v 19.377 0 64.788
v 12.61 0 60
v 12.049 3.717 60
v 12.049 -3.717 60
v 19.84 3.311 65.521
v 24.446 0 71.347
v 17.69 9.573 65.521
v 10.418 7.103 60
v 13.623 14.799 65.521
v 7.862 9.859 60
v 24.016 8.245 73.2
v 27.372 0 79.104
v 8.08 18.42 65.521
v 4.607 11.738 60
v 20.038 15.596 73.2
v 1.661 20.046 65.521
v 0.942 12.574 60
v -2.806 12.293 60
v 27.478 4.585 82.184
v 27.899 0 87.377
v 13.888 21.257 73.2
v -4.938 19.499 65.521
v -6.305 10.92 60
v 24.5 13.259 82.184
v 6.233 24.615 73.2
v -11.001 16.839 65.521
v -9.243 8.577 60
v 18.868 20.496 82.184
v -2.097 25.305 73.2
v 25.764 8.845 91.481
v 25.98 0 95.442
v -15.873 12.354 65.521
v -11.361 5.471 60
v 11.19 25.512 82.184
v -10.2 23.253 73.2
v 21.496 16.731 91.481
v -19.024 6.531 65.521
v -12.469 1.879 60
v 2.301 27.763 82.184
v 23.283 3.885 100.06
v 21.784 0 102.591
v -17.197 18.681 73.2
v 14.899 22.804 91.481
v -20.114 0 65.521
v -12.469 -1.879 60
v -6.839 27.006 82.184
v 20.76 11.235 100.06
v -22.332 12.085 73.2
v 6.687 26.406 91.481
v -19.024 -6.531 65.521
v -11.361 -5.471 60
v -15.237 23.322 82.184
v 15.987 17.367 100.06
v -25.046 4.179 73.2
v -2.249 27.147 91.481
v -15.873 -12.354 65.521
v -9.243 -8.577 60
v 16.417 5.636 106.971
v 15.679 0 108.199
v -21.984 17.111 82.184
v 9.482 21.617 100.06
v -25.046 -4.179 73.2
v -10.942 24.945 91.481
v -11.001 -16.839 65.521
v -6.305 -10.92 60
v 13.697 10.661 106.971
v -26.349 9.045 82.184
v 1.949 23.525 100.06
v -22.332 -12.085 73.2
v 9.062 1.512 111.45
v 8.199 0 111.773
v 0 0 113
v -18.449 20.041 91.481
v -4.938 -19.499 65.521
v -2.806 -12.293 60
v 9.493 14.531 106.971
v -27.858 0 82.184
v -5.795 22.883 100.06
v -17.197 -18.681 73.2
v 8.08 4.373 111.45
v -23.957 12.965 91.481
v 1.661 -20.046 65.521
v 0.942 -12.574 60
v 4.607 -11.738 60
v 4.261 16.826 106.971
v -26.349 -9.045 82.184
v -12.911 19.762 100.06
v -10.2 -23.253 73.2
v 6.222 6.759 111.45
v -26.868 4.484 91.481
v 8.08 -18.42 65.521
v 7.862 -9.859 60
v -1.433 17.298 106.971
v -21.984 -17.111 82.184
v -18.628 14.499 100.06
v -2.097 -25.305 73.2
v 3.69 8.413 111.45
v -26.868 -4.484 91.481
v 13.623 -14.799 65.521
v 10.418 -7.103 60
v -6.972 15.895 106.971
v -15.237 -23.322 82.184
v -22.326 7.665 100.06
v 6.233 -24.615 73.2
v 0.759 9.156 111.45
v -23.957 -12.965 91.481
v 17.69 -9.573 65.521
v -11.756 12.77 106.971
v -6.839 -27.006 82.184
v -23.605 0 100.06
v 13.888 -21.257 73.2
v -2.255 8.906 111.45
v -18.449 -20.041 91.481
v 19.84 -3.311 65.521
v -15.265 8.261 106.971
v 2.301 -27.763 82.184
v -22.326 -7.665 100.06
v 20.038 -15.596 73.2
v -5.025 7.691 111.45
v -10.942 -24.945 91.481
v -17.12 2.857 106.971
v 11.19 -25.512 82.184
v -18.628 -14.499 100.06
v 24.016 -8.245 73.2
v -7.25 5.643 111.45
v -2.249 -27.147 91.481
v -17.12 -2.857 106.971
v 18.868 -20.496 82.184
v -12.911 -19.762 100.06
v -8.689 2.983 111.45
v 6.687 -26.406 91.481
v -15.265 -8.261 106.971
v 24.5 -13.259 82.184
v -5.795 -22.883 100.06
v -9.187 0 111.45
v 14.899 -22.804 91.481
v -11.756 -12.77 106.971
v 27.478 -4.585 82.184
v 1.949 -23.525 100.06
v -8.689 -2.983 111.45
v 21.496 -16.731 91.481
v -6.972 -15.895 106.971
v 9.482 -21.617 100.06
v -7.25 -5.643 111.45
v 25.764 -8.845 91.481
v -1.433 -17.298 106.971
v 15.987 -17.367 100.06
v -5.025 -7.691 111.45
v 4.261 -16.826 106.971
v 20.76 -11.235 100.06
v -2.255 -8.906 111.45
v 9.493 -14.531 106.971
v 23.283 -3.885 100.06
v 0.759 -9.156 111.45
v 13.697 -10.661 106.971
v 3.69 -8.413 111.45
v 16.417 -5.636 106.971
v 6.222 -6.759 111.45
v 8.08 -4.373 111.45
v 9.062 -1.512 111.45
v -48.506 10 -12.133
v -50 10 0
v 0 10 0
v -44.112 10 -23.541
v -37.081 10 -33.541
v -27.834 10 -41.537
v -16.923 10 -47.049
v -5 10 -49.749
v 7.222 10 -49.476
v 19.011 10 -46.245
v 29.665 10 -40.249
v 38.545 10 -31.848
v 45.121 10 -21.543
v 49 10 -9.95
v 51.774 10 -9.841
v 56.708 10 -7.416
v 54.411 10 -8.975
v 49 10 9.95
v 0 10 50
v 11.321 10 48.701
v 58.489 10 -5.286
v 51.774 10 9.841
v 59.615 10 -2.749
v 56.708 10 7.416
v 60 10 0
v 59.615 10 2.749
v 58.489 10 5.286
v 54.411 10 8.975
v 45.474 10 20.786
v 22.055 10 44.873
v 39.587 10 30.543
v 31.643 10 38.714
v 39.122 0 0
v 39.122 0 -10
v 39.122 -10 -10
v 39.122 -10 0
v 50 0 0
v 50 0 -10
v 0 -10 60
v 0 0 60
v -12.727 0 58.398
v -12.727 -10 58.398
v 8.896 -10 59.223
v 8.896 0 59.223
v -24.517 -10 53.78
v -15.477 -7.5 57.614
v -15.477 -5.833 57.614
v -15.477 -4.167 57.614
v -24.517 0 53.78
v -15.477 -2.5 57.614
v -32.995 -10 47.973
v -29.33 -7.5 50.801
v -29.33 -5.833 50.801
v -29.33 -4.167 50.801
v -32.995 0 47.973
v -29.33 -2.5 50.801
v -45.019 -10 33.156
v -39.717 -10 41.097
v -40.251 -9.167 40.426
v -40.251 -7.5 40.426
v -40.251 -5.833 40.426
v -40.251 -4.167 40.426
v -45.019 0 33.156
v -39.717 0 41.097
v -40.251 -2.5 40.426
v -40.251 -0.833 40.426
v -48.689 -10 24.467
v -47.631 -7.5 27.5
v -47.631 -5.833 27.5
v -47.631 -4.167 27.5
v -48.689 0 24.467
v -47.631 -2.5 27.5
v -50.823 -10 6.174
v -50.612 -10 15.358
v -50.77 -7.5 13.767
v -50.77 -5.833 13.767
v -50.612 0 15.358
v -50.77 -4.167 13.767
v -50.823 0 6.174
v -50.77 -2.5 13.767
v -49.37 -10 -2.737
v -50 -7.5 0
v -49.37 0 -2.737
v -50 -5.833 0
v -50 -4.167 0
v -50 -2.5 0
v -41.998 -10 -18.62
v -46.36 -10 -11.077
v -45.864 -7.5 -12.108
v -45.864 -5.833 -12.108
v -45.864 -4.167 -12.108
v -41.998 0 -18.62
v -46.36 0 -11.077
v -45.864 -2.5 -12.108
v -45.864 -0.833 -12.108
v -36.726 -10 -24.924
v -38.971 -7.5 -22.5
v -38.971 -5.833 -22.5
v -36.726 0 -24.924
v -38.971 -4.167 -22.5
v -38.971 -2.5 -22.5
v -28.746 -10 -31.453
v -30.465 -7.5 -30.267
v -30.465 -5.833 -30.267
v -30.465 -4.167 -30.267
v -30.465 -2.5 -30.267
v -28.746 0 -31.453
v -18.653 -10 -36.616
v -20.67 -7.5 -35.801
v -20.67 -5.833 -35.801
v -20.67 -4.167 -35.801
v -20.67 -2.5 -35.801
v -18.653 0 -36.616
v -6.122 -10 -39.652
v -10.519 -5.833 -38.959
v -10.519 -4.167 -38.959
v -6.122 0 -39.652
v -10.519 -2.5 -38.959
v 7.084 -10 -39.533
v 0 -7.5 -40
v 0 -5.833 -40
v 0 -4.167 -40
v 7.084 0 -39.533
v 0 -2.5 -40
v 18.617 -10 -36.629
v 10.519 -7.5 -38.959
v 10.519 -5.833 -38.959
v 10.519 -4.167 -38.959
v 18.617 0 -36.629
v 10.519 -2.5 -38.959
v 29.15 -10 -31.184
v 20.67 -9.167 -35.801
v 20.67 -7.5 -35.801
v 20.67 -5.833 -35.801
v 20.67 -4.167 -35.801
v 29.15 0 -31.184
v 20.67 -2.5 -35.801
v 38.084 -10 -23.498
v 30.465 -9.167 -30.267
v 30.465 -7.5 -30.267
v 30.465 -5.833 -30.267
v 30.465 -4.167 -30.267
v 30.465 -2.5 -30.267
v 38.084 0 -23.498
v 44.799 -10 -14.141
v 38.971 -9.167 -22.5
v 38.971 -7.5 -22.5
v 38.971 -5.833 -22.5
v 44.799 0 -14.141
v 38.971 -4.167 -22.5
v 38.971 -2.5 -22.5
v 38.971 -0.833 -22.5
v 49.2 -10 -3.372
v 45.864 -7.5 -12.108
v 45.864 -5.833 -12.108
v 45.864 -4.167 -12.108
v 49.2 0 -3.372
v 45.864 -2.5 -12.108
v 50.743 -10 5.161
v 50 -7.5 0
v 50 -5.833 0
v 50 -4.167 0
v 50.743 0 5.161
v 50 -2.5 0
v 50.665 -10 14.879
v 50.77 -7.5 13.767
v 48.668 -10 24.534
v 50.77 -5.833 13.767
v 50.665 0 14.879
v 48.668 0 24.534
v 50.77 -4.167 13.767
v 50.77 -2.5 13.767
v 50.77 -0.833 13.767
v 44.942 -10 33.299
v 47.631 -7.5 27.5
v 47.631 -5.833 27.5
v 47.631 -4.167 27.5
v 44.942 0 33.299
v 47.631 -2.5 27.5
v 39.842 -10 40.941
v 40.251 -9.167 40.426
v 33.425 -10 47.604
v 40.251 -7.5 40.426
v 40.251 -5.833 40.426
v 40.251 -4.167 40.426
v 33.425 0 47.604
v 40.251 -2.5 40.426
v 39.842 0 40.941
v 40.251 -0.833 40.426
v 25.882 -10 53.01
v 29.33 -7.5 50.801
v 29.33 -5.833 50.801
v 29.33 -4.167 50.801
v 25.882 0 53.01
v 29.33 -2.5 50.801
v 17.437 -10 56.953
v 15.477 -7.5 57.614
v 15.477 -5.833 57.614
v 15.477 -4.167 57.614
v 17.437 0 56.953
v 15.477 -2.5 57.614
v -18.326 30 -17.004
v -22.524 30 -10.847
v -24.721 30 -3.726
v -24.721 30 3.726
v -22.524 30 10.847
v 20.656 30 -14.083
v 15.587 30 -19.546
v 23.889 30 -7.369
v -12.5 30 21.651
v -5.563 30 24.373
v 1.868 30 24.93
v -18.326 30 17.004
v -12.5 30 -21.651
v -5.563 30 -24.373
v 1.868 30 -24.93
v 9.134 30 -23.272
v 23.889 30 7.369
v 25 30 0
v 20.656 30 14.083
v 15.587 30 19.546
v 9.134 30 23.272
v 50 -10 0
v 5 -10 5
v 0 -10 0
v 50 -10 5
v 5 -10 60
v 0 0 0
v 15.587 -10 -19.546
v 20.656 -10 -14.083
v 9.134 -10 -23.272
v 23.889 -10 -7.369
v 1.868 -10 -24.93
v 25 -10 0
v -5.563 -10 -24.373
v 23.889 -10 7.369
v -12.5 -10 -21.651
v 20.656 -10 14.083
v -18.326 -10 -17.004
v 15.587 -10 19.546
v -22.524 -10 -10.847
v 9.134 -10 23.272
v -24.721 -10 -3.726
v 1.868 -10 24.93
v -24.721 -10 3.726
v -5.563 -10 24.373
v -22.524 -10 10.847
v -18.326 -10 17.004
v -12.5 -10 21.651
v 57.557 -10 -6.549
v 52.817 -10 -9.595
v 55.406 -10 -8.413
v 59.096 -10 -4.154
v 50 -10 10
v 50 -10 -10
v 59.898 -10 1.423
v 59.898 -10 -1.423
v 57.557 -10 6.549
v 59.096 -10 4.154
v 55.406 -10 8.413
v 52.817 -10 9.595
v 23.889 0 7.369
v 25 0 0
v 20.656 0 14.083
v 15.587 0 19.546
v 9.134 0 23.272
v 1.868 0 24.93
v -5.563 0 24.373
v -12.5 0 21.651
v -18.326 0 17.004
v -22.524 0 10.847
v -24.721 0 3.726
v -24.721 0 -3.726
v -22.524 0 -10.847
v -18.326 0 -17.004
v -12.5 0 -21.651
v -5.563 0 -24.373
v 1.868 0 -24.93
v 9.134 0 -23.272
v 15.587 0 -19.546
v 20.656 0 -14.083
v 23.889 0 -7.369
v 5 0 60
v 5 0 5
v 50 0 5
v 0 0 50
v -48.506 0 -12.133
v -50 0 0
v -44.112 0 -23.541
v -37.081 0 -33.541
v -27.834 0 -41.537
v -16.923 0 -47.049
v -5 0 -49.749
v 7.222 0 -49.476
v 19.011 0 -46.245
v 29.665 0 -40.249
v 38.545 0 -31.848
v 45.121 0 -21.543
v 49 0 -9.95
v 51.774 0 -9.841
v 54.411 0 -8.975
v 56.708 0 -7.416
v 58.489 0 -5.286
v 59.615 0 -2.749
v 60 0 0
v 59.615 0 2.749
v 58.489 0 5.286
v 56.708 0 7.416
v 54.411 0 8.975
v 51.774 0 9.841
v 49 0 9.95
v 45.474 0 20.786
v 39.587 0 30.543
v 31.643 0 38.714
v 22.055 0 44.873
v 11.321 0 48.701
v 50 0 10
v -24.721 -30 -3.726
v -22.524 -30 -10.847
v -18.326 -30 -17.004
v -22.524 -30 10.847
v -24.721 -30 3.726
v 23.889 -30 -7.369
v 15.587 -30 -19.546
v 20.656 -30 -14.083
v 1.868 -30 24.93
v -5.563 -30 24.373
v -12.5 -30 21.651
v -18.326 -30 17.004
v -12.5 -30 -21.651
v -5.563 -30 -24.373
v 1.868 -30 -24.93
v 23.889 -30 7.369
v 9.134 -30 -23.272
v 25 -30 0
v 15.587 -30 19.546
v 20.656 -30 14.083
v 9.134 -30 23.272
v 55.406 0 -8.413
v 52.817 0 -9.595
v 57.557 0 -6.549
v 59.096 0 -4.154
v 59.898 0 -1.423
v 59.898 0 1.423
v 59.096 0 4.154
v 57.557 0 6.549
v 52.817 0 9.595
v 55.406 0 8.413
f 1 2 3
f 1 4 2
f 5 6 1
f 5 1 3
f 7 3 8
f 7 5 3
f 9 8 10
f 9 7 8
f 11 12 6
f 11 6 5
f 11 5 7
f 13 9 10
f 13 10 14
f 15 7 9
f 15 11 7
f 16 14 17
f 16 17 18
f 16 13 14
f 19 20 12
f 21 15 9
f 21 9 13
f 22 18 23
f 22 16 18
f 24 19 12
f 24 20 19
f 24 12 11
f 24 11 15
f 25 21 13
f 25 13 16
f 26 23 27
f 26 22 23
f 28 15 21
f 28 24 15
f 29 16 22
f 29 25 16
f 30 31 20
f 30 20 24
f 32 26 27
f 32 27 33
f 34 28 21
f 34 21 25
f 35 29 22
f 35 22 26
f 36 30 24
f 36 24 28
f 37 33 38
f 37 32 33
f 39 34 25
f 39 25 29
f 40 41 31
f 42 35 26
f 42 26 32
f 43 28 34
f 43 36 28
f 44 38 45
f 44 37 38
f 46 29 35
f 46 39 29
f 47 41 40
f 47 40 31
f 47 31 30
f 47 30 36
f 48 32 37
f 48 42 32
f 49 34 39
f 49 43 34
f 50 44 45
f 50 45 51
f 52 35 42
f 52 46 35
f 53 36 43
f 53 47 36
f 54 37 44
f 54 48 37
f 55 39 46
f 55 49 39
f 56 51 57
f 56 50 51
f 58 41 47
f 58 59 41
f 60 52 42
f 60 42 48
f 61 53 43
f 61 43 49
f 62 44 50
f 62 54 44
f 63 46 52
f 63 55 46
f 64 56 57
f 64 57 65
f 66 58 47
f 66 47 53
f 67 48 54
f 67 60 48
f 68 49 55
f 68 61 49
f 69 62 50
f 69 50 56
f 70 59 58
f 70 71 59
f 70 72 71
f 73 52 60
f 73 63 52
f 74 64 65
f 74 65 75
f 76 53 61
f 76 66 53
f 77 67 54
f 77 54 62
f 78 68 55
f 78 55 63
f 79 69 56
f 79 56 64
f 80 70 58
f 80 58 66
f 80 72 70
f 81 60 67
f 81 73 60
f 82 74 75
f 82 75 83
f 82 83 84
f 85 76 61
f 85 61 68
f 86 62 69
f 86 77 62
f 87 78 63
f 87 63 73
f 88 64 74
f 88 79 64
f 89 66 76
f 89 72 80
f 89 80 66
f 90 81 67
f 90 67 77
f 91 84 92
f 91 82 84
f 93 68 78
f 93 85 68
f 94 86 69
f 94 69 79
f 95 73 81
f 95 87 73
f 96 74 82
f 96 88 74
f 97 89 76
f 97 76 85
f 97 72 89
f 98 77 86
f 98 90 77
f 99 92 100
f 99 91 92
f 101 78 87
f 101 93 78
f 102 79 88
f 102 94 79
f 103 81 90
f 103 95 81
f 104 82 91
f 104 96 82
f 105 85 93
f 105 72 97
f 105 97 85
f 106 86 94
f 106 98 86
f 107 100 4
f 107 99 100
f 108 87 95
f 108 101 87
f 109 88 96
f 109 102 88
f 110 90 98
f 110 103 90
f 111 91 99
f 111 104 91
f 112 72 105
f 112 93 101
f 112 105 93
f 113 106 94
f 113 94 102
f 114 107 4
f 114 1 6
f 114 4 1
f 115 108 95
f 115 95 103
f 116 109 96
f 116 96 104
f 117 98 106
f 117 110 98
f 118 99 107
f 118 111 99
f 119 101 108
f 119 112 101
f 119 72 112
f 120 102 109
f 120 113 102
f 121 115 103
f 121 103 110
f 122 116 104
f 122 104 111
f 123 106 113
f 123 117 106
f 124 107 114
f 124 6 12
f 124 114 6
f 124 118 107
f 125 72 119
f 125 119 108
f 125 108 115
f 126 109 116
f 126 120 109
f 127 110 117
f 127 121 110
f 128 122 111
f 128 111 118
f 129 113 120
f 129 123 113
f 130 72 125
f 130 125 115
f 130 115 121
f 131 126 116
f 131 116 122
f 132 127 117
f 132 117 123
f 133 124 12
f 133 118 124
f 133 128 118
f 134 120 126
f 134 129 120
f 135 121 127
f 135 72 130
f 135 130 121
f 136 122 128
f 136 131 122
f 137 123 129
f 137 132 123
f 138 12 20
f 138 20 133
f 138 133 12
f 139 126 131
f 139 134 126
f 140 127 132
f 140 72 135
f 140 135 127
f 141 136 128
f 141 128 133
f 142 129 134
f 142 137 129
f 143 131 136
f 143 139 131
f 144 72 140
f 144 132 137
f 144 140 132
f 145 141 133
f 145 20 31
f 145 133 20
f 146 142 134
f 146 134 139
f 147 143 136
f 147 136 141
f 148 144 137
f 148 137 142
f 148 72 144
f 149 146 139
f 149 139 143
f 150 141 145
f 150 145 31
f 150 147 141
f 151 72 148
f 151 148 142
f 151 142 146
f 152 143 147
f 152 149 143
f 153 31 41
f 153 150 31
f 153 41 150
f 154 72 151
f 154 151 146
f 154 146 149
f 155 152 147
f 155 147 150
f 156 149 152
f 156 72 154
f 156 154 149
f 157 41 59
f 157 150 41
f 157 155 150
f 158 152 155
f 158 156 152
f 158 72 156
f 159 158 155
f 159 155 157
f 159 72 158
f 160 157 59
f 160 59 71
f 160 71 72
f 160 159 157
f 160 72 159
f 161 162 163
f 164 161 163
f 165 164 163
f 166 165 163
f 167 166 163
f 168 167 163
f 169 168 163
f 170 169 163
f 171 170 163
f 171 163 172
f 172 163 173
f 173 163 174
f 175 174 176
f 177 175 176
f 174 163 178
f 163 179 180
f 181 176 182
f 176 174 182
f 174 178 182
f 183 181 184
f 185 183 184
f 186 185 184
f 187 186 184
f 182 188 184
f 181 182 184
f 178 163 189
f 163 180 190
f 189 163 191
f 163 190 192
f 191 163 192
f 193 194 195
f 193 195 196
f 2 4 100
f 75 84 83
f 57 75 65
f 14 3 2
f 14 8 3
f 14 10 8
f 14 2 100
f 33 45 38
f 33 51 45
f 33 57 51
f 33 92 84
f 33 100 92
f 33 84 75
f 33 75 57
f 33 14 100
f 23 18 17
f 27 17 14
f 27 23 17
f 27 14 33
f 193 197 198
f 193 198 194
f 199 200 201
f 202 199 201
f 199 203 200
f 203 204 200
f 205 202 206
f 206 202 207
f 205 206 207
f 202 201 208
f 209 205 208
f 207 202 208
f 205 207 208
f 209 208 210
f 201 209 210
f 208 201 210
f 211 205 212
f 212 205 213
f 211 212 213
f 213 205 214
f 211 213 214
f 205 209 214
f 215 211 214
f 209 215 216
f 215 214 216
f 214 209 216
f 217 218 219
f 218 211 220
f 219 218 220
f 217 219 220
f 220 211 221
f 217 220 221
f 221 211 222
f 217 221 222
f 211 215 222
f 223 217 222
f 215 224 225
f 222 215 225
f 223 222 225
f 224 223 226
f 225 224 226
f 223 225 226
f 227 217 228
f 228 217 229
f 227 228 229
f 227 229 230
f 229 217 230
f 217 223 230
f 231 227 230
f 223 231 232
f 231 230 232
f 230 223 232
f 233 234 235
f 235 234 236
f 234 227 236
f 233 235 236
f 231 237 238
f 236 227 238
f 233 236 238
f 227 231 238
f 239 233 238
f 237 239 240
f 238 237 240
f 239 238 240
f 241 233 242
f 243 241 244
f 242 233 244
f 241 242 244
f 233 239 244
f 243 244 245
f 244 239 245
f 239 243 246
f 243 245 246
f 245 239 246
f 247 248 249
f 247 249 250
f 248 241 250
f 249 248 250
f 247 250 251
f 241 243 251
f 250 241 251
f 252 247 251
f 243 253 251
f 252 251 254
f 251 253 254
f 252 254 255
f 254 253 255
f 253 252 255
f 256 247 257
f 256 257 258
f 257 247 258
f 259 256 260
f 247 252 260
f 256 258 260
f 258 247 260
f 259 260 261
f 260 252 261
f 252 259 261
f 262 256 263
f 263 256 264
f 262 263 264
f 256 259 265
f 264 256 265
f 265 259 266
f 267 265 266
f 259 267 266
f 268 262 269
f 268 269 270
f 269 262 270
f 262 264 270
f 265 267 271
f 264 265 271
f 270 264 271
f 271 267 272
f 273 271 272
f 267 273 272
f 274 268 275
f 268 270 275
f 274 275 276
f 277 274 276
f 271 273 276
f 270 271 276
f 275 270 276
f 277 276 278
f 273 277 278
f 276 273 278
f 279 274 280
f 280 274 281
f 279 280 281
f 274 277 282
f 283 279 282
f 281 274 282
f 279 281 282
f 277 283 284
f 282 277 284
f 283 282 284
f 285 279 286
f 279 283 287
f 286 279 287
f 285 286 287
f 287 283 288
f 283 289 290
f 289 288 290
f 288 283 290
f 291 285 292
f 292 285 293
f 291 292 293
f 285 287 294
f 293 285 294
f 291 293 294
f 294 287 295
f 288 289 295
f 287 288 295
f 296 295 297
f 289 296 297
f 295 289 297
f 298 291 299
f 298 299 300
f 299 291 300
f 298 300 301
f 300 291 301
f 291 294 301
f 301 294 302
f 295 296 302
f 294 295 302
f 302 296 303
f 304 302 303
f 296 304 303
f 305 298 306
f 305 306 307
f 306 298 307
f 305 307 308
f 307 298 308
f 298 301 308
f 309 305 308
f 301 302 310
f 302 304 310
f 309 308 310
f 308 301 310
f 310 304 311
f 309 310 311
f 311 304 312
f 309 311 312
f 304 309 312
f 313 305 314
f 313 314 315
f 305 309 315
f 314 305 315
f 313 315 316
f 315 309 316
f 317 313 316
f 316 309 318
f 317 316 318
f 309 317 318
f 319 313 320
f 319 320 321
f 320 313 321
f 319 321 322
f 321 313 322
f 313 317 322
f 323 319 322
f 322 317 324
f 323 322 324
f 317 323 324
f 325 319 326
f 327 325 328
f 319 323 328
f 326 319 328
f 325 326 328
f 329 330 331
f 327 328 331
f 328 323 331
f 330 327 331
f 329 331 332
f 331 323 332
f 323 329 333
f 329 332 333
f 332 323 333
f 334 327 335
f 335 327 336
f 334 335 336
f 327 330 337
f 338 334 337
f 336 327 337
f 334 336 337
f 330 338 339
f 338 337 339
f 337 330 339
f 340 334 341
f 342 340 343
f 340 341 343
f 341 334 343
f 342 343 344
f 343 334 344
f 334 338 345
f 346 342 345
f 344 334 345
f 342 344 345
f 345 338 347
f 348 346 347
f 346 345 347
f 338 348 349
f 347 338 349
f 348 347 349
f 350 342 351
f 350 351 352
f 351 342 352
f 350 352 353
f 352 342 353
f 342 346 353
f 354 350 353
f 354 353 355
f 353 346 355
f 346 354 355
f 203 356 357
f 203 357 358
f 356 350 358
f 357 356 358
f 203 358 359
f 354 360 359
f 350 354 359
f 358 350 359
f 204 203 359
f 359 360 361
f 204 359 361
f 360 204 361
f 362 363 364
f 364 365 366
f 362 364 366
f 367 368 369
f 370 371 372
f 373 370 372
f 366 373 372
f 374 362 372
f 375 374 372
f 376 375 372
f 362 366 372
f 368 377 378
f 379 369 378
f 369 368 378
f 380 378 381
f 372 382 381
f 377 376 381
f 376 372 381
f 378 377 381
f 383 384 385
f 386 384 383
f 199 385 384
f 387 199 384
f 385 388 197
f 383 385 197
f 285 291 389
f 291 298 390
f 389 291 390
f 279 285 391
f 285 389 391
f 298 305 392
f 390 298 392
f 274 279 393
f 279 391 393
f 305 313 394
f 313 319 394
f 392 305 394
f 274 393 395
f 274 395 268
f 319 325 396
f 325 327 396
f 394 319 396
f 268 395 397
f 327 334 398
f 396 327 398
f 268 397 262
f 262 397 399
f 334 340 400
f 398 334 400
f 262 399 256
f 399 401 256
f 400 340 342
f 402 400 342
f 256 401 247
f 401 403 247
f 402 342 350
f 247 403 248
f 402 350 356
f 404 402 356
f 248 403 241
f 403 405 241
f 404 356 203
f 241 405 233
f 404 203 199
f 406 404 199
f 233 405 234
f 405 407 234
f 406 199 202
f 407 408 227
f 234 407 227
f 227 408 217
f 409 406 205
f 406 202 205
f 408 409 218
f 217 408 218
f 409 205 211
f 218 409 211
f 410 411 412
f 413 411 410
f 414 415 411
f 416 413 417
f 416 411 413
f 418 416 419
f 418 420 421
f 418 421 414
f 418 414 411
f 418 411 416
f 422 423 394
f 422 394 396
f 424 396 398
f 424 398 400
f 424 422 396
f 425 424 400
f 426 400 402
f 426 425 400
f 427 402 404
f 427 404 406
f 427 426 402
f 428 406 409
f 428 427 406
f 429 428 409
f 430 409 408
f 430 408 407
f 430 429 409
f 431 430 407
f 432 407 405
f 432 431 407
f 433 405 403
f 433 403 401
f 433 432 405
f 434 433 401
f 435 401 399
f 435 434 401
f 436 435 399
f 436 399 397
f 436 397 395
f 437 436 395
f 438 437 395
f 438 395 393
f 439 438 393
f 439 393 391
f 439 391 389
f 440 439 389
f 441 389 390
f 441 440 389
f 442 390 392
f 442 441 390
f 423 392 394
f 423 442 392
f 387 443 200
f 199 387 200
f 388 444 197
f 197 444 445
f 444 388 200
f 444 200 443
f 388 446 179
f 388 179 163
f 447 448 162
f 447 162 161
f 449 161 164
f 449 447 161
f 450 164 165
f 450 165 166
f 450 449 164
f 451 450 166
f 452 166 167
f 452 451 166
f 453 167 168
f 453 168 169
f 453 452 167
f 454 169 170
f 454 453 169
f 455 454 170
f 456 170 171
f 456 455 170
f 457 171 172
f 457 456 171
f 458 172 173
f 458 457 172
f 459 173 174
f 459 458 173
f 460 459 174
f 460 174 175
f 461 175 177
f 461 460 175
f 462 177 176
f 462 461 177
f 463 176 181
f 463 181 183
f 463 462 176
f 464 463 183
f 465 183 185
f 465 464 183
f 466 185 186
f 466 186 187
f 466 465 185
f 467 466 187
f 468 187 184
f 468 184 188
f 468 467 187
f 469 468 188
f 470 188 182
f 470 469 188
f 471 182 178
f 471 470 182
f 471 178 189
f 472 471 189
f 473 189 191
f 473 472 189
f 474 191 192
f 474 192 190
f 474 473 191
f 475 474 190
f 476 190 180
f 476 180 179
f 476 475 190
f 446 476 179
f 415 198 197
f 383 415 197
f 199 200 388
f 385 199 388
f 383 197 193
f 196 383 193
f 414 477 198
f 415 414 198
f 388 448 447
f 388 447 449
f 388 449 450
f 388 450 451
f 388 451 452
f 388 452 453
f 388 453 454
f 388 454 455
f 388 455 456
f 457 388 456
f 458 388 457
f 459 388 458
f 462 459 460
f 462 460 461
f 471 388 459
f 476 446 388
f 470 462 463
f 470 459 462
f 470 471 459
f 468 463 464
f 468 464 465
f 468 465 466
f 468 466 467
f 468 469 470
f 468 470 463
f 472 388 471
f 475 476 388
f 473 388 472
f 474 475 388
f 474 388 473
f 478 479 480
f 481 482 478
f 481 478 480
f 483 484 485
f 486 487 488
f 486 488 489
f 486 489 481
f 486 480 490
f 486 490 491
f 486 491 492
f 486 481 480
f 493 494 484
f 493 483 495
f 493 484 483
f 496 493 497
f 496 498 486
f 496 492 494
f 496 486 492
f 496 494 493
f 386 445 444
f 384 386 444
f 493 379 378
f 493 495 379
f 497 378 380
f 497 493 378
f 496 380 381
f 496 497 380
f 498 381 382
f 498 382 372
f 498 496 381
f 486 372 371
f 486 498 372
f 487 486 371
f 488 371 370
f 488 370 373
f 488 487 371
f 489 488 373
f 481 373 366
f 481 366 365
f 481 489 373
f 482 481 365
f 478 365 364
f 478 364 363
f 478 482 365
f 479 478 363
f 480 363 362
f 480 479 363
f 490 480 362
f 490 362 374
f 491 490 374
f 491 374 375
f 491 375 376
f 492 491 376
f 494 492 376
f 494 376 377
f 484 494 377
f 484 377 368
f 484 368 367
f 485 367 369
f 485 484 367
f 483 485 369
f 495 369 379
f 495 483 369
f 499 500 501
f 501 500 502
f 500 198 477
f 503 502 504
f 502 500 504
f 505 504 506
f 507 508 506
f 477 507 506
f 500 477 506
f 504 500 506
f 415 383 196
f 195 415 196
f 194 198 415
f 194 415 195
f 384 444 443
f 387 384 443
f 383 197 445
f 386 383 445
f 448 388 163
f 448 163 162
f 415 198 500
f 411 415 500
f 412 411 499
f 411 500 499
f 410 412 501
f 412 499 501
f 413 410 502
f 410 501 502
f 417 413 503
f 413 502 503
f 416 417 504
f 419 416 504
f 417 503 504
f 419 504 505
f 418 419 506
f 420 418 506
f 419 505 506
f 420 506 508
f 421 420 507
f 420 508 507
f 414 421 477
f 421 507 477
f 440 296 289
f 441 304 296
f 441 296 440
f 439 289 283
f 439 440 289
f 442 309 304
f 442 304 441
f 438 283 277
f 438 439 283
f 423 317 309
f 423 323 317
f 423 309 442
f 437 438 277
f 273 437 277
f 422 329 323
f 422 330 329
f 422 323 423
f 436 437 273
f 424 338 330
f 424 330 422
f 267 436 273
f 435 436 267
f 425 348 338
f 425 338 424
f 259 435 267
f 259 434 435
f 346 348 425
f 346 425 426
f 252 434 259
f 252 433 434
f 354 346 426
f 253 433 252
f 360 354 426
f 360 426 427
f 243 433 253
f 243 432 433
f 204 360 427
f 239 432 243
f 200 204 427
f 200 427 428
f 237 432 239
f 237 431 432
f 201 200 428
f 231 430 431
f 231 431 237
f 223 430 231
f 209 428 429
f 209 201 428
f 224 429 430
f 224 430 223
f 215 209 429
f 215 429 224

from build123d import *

# Parameters (mm, degrees)
F1_DEPTH  = 10
F2_R      = 25
F3_DEPTH  = 10
F4_R      = 25
F5_DEPTH  = 30
F7_DEPTH  = 10
F8_W      = 10.8778804541
F8_H      = 10
F9_DEPTH  = 10
F11_DEPTH = 10


with BuildPart() as f1:
    # F0 (on Front) → F1 (new body)
    with BuildSketch(Plane.XZ):
        with BuildLine():
            ThreePointArc((49, -9.9498743711), (60, 0), (49, 9.9498743711))
            ThreePointArc((49, 9.9498743711), (31.6425842927, 38.7136521046), (0, 50))
            Line((0, 50), (0, 0))
            Line((0, 0), (-50, 0))
            ThreePointArc((-50, 0), (-5, -49.7493718553), (49, -9.9498743711))
        make_face()
    extrude(amount=-F1_DEPTH)


with BuildPart() as f3:
    # F2 (on Front) → F3 (new body)
    with BuildSketch(Plane.XZ):
        with BuildLine():
            add(Edge.make_bspline(
                [(0, 60), (10.5955112347, 60), (31.0170440376, 53.4689164463), (50.3202952678, 28.6766808515), (52.462705512, -0.3242302637), (40.5772324961, -23.6909061622), (21.336302393, -37.1993713746), (7.0790546268, -40), (0, -40)],
                knots=[0, 0, 0, 0, 0.1812077606, 0.3591147159, 0.5308273571, 0.6944349973, 0.8498959386, 1, 1, 1, 1], degree=3))
            add(Edge.make_bspline(
                [(0, 60), (-10.5955112347, 60), (-31.0170440376, 53.4689164463), (-50.3202952678, 28.6766808515), (-52.462705512, -0.3242302637), (-40.5772324961, -23.6909061622), (-21.336302393, -37.1993713746), (-7.0790546268, -40), (0, -40)],
                knots=[0, 0, 0, 0, 0.1812077606, 0.3591147159, 0.5308273571, 0.6944349973, 0.8498959386, 1, 1, 1, 1], degree=3))
        make_face()
        Circle(F2_R, mode=Mode.SUBTRACT)
    extrude(amount=F3_DEPTH)


with BuildPart() as f5:
    # F4 (on Front) → F5 (new body, symmetric)
    with BuildSketch(Plane.XZ):
        Circle(F4_R)
    extrude(amount=F5_DEPTH, both=True)


with BuildPart() as f7:
    # F6 (on face) → F7 (new body)
    with BuildSketch(Plane.XZ):
        with BuildLine():
            Line((50, 10), (50, -10))
            ThreePointArc((50, -10), (60, 0), (50, 10))
        make_face()
    extrude(amount=F7_DEPTH)


with BuildPart() as f9:
    # F8 (on face) → F9 (new body)
    with BuildSketch(Plane(origin=(0, 0, 0), x_dir=(-1, 0, 0), z_dir=(0, 1, 0))):
        with Locations((-44.561059773, -5)):
            Rectangle(F8_W, F8_H)
    extrude(amount=-F9_DEPTH)


with BuildPart() as f11:
    # F10 (on Front) → F11 (new body)
    with BuildSketch(Plane.XZ):
        Polygon((0, 60), (0, 0), (50, 0), (50, 5), (5, 5), (5, 60), align=None)
    extrude(amount=F11_DEPTH)


with BuildPart() as f13:
    # F12 (on Front) → F13 (revolve)
    with BuildSketch(Plane.XZ):
        with BuildLine():
            Line((0, 60), (12.6095202129, 60))
            ThreePointArc((12.6095202129, 60), (27.2396769438, 91.4807406984), (0, 113))
            Line((0, 113), (0, 60))
        make_face()
    revolve(axis=Axis((0, 0, 86.5), (0, 0, 1)))


solid = Compound([f1.part, f3.part, f5.part, f7.part, f9.part, f11.part, f13.part])
